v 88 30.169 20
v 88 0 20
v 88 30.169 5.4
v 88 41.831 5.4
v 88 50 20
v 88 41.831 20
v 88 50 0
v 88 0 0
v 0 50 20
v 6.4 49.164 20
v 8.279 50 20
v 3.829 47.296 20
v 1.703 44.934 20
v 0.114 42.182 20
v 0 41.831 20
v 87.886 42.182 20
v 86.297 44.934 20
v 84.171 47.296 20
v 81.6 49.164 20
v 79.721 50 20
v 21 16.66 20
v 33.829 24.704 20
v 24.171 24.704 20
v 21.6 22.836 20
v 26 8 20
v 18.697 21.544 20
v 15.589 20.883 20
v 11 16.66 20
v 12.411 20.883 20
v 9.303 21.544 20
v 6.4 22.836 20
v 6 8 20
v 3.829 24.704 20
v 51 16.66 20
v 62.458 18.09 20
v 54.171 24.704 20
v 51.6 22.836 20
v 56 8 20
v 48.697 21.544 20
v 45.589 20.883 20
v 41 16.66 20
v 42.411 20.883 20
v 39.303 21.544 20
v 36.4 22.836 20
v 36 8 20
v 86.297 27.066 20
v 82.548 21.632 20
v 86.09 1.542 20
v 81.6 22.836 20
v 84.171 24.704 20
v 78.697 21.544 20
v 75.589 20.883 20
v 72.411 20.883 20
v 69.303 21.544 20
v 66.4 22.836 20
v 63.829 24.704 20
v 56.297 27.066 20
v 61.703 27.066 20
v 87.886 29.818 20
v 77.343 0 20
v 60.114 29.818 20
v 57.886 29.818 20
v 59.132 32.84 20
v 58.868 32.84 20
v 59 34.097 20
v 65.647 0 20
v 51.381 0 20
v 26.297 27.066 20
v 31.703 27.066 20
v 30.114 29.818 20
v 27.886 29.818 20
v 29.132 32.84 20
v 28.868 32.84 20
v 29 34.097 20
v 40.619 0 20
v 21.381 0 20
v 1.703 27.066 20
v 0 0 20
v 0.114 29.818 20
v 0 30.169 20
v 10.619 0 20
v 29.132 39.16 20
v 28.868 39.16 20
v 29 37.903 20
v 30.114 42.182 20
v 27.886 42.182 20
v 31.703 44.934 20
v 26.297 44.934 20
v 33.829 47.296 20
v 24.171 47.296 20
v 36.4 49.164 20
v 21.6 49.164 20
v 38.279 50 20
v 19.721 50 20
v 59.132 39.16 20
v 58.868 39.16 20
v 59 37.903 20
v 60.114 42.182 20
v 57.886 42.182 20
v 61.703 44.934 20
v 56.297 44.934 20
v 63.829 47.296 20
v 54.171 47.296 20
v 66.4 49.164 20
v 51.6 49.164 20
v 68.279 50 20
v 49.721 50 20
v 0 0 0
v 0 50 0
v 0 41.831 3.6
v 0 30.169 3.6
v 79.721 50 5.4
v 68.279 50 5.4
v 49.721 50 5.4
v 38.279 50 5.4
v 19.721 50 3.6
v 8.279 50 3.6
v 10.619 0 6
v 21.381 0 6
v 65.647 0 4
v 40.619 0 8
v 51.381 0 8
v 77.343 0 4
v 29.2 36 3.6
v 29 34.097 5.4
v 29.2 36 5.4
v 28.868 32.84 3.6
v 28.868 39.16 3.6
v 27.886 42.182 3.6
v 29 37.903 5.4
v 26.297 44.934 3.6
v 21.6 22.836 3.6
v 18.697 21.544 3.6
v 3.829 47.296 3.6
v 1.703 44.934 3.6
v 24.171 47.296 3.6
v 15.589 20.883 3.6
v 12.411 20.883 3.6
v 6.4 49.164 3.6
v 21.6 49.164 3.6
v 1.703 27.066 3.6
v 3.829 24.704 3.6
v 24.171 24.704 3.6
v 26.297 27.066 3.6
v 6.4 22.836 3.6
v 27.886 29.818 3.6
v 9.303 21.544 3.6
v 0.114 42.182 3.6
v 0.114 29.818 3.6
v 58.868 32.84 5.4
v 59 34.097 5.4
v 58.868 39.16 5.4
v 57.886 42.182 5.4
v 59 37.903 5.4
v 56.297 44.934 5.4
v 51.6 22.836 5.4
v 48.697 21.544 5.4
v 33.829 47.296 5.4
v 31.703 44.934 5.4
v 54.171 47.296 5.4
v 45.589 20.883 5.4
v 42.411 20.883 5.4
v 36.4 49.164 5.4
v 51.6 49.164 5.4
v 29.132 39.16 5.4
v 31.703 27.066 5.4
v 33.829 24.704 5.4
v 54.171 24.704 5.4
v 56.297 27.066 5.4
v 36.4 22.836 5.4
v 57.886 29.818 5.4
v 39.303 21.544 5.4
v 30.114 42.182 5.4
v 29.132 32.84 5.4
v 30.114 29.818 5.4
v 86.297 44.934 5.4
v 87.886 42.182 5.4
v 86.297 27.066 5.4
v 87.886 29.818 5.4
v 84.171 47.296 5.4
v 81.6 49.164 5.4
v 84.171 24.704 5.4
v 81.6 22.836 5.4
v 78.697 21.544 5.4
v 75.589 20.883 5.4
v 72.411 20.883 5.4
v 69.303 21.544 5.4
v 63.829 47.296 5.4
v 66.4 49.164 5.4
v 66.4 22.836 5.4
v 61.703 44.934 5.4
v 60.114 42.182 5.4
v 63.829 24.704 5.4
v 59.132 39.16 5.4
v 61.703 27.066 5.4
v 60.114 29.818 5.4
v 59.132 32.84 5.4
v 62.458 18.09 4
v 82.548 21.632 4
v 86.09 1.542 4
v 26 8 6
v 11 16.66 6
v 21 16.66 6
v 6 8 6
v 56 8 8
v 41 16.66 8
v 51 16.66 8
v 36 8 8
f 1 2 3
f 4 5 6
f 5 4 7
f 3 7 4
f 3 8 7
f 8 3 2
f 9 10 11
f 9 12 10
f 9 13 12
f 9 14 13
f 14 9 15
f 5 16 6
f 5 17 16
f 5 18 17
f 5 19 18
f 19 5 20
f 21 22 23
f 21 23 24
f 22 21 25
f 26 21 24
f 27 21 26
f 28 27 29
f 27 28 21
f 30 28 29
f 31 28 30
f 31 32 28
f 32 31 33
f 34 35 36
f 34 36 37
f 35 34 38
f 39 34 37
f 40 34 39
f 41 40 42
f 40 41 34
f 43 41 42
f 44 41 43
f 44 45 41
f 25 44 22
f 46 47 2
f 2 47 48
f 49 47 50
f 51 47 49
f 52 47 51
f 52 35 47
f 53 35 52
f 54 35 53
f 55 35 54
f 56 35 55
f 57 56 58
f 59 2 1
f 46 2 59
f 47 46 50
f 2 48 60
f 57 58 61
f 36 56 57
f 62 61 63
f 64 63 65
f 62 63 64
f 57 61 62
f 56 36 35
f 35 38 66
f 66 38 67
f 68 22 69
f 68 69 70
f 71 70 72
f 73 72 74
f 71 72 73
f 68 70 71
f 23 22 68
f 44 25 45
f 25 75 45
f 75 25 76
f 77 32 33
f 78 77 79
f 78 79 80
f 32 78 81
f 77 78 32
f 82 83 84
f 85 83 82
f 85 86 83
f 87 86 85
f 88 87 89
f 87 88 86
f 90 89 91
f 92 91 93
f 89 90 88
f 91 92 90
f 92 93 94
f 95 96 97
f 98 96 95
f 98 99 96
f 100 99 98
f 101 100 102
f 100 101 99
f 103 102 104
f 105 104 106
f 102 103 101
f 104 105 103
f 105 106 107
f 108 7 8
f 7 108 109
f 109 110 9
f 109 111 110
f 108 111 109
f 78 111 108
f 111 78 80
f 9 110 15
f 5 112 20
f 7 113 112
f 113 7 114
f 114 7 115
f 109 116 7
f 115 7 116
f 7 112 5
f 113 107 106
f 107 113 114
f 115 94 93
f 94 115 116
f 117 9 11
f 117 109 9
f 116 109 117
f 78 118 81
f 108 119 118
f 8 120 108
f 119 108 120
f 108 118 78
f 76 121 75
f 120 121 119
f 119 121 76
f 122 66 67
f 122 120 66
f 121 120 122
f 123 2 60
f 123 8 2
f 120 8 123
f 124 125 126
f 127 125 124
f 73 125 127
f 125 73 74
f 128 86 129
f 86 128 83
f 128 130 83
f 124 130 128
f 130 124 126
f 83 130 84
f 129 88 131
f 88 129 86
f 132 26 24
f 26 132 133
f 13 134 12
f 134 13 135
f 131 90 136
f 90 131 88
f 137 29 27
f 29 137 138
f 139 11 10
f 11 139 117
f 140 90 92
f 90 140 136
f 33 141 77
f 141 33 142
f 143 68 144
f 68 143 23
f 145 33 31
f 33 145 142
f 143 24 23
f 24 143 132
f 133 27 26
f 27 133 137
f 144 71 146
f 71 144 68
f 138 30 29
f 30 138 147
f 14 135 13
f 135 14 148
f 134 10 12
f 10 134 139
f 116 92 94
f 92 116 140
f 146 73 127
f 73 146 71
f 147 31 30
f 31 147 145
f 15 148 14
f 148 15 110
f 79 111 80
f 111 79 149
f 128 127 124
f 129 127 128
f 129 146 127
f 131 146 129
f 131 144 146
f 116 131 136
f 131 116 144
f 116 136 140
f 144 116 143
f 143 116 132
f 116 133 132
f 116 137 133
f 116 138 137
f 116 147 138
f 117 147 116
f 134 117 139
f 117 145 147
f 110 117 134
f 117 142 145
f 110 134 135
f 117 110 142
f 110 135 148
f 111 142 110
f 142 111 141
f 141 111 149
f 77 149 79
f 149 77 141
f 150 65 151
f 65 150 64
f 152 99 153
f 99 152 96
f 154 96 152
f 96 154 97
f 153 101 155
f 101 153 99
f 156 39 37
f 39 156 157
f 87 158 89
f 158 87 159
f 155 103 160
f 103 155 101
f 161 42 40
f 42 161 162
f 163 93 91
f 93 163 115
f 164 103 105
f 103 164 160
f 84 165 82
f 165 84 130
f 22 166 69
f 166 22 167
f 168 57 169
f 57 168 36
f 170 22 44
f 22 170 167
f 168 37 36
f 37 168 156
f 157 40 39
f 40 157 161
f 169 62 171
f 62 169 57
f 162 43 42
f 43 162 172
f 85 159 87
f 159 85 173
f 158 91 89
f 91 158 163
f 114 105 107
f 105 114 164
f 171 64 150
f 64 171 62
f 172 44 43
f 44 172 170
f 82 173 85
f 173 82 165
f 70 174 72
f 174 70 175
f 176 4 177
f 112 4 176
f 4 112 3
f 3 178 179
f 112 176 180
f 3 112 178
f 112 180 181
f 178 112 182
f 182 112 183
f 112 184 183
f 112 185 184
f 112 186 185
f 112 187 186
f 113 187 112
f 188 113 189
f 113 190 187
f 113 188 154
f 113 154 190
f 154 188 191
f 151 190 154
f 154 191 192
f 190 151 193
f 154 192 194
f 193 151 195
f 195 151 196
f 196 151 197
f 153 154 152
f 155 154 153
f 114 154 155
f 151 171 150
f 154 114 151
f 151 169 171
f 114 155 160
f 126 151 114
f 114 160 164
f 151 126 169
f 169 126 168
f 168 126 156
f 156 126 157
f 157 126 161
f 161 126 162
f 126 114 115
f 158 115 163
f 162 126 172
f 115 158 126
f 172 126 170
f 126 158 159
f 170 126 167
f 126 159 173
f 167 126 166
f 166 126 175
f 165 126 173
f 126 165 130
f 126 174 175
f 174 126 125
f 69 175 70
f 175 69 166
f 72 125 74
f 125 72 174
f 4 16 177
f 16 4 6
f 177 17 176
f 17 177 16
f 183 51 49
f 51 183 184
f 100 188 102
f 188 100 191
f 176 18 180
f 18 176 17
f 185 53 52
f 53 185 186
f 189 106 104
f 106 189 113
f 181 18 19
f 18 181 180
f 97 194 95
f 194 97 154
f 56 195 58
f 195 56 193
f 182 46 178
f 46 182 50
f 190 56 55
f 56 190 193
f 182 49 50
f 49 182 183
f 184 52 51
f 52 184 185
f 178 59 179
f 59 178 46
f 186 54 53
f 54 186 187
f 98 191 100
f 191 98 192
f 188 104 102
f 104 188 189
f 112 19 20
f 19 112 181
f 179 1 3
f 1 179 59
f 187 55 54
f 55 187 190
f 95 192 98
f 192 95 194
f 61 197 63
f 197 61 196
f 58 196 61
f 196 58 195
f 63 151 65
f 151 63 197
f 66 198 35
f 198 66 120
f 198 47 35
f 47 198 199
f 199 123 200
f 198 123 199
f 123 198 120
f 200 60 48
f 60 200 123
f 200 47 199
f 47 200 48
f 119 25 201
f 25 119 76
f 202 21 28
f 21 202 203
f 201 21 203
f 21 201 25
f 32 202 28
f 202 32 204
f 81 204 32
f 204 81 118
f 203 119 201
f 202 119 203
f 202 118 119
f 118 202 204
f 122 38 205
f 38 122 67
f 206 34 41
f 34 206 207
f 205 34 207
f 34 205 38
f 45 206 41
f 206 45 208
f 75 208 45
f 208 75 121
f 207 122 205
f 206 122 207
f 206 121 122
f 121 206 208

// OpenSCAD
// Undaunted 2200

module trayOne() {
    depth = 20;
    height = 50;
    difference() {
        cube([88,height,depth]);
        translate([14,height-14,depth-16.4]) cylinder(h=depth,d=30.4);
        translate([44,height-14,depth-14.6]) cylinder(h=depth,d=30.4);
        translate([74,height-14,depth-14.6]) cylinder(h=depth,d=30.4);
        translate([66,-2,4]) rotate([0,0,10]) cube([20.4,20.4,depth]);
        translate([16,8,depth-14]) cylinder(h=depth,d=depth,$fn=6);
        translate([46,8,depth-12]) cylinder(h=depth,d=depth,$fn=6);
    }
}

module trayTwo() {
    depth = 28;
    height = 45;
    difference() {
        cube([86,height,depth]);
        translate([12,9,depth-14.6]) cylinder(h=depth,d=20.4);
        translate([12,height-9,depth-14.6]) cylinder(h=depth,d=20.4);
        translate([1,(height-9)/2,depth-9]) cube([31,9,depth]);
        translate([34,9,depth-14.6]) cylinder(h=depth,d=20.4);
        translate([34,height-9,depth-14.6]) cylinder(h=depth,d=20.4);
        translate([56,9,28-14.6]) cylinder(h=depth,d=20.4);
        translate([56,height-9,depth-14.6]) cylinder(h=depth,d=20.4);
        translate([40,(height-9)/2,depth-20]) cube([21,9,depth]);
        translate([76,height/2,depth-4]) cylinder(h=depth,d=26);
        translate([78,height/2,depth-4-12]) cylinder(h=depth,d=20.4);
    }
}

trayOne();
// trayTwo();
